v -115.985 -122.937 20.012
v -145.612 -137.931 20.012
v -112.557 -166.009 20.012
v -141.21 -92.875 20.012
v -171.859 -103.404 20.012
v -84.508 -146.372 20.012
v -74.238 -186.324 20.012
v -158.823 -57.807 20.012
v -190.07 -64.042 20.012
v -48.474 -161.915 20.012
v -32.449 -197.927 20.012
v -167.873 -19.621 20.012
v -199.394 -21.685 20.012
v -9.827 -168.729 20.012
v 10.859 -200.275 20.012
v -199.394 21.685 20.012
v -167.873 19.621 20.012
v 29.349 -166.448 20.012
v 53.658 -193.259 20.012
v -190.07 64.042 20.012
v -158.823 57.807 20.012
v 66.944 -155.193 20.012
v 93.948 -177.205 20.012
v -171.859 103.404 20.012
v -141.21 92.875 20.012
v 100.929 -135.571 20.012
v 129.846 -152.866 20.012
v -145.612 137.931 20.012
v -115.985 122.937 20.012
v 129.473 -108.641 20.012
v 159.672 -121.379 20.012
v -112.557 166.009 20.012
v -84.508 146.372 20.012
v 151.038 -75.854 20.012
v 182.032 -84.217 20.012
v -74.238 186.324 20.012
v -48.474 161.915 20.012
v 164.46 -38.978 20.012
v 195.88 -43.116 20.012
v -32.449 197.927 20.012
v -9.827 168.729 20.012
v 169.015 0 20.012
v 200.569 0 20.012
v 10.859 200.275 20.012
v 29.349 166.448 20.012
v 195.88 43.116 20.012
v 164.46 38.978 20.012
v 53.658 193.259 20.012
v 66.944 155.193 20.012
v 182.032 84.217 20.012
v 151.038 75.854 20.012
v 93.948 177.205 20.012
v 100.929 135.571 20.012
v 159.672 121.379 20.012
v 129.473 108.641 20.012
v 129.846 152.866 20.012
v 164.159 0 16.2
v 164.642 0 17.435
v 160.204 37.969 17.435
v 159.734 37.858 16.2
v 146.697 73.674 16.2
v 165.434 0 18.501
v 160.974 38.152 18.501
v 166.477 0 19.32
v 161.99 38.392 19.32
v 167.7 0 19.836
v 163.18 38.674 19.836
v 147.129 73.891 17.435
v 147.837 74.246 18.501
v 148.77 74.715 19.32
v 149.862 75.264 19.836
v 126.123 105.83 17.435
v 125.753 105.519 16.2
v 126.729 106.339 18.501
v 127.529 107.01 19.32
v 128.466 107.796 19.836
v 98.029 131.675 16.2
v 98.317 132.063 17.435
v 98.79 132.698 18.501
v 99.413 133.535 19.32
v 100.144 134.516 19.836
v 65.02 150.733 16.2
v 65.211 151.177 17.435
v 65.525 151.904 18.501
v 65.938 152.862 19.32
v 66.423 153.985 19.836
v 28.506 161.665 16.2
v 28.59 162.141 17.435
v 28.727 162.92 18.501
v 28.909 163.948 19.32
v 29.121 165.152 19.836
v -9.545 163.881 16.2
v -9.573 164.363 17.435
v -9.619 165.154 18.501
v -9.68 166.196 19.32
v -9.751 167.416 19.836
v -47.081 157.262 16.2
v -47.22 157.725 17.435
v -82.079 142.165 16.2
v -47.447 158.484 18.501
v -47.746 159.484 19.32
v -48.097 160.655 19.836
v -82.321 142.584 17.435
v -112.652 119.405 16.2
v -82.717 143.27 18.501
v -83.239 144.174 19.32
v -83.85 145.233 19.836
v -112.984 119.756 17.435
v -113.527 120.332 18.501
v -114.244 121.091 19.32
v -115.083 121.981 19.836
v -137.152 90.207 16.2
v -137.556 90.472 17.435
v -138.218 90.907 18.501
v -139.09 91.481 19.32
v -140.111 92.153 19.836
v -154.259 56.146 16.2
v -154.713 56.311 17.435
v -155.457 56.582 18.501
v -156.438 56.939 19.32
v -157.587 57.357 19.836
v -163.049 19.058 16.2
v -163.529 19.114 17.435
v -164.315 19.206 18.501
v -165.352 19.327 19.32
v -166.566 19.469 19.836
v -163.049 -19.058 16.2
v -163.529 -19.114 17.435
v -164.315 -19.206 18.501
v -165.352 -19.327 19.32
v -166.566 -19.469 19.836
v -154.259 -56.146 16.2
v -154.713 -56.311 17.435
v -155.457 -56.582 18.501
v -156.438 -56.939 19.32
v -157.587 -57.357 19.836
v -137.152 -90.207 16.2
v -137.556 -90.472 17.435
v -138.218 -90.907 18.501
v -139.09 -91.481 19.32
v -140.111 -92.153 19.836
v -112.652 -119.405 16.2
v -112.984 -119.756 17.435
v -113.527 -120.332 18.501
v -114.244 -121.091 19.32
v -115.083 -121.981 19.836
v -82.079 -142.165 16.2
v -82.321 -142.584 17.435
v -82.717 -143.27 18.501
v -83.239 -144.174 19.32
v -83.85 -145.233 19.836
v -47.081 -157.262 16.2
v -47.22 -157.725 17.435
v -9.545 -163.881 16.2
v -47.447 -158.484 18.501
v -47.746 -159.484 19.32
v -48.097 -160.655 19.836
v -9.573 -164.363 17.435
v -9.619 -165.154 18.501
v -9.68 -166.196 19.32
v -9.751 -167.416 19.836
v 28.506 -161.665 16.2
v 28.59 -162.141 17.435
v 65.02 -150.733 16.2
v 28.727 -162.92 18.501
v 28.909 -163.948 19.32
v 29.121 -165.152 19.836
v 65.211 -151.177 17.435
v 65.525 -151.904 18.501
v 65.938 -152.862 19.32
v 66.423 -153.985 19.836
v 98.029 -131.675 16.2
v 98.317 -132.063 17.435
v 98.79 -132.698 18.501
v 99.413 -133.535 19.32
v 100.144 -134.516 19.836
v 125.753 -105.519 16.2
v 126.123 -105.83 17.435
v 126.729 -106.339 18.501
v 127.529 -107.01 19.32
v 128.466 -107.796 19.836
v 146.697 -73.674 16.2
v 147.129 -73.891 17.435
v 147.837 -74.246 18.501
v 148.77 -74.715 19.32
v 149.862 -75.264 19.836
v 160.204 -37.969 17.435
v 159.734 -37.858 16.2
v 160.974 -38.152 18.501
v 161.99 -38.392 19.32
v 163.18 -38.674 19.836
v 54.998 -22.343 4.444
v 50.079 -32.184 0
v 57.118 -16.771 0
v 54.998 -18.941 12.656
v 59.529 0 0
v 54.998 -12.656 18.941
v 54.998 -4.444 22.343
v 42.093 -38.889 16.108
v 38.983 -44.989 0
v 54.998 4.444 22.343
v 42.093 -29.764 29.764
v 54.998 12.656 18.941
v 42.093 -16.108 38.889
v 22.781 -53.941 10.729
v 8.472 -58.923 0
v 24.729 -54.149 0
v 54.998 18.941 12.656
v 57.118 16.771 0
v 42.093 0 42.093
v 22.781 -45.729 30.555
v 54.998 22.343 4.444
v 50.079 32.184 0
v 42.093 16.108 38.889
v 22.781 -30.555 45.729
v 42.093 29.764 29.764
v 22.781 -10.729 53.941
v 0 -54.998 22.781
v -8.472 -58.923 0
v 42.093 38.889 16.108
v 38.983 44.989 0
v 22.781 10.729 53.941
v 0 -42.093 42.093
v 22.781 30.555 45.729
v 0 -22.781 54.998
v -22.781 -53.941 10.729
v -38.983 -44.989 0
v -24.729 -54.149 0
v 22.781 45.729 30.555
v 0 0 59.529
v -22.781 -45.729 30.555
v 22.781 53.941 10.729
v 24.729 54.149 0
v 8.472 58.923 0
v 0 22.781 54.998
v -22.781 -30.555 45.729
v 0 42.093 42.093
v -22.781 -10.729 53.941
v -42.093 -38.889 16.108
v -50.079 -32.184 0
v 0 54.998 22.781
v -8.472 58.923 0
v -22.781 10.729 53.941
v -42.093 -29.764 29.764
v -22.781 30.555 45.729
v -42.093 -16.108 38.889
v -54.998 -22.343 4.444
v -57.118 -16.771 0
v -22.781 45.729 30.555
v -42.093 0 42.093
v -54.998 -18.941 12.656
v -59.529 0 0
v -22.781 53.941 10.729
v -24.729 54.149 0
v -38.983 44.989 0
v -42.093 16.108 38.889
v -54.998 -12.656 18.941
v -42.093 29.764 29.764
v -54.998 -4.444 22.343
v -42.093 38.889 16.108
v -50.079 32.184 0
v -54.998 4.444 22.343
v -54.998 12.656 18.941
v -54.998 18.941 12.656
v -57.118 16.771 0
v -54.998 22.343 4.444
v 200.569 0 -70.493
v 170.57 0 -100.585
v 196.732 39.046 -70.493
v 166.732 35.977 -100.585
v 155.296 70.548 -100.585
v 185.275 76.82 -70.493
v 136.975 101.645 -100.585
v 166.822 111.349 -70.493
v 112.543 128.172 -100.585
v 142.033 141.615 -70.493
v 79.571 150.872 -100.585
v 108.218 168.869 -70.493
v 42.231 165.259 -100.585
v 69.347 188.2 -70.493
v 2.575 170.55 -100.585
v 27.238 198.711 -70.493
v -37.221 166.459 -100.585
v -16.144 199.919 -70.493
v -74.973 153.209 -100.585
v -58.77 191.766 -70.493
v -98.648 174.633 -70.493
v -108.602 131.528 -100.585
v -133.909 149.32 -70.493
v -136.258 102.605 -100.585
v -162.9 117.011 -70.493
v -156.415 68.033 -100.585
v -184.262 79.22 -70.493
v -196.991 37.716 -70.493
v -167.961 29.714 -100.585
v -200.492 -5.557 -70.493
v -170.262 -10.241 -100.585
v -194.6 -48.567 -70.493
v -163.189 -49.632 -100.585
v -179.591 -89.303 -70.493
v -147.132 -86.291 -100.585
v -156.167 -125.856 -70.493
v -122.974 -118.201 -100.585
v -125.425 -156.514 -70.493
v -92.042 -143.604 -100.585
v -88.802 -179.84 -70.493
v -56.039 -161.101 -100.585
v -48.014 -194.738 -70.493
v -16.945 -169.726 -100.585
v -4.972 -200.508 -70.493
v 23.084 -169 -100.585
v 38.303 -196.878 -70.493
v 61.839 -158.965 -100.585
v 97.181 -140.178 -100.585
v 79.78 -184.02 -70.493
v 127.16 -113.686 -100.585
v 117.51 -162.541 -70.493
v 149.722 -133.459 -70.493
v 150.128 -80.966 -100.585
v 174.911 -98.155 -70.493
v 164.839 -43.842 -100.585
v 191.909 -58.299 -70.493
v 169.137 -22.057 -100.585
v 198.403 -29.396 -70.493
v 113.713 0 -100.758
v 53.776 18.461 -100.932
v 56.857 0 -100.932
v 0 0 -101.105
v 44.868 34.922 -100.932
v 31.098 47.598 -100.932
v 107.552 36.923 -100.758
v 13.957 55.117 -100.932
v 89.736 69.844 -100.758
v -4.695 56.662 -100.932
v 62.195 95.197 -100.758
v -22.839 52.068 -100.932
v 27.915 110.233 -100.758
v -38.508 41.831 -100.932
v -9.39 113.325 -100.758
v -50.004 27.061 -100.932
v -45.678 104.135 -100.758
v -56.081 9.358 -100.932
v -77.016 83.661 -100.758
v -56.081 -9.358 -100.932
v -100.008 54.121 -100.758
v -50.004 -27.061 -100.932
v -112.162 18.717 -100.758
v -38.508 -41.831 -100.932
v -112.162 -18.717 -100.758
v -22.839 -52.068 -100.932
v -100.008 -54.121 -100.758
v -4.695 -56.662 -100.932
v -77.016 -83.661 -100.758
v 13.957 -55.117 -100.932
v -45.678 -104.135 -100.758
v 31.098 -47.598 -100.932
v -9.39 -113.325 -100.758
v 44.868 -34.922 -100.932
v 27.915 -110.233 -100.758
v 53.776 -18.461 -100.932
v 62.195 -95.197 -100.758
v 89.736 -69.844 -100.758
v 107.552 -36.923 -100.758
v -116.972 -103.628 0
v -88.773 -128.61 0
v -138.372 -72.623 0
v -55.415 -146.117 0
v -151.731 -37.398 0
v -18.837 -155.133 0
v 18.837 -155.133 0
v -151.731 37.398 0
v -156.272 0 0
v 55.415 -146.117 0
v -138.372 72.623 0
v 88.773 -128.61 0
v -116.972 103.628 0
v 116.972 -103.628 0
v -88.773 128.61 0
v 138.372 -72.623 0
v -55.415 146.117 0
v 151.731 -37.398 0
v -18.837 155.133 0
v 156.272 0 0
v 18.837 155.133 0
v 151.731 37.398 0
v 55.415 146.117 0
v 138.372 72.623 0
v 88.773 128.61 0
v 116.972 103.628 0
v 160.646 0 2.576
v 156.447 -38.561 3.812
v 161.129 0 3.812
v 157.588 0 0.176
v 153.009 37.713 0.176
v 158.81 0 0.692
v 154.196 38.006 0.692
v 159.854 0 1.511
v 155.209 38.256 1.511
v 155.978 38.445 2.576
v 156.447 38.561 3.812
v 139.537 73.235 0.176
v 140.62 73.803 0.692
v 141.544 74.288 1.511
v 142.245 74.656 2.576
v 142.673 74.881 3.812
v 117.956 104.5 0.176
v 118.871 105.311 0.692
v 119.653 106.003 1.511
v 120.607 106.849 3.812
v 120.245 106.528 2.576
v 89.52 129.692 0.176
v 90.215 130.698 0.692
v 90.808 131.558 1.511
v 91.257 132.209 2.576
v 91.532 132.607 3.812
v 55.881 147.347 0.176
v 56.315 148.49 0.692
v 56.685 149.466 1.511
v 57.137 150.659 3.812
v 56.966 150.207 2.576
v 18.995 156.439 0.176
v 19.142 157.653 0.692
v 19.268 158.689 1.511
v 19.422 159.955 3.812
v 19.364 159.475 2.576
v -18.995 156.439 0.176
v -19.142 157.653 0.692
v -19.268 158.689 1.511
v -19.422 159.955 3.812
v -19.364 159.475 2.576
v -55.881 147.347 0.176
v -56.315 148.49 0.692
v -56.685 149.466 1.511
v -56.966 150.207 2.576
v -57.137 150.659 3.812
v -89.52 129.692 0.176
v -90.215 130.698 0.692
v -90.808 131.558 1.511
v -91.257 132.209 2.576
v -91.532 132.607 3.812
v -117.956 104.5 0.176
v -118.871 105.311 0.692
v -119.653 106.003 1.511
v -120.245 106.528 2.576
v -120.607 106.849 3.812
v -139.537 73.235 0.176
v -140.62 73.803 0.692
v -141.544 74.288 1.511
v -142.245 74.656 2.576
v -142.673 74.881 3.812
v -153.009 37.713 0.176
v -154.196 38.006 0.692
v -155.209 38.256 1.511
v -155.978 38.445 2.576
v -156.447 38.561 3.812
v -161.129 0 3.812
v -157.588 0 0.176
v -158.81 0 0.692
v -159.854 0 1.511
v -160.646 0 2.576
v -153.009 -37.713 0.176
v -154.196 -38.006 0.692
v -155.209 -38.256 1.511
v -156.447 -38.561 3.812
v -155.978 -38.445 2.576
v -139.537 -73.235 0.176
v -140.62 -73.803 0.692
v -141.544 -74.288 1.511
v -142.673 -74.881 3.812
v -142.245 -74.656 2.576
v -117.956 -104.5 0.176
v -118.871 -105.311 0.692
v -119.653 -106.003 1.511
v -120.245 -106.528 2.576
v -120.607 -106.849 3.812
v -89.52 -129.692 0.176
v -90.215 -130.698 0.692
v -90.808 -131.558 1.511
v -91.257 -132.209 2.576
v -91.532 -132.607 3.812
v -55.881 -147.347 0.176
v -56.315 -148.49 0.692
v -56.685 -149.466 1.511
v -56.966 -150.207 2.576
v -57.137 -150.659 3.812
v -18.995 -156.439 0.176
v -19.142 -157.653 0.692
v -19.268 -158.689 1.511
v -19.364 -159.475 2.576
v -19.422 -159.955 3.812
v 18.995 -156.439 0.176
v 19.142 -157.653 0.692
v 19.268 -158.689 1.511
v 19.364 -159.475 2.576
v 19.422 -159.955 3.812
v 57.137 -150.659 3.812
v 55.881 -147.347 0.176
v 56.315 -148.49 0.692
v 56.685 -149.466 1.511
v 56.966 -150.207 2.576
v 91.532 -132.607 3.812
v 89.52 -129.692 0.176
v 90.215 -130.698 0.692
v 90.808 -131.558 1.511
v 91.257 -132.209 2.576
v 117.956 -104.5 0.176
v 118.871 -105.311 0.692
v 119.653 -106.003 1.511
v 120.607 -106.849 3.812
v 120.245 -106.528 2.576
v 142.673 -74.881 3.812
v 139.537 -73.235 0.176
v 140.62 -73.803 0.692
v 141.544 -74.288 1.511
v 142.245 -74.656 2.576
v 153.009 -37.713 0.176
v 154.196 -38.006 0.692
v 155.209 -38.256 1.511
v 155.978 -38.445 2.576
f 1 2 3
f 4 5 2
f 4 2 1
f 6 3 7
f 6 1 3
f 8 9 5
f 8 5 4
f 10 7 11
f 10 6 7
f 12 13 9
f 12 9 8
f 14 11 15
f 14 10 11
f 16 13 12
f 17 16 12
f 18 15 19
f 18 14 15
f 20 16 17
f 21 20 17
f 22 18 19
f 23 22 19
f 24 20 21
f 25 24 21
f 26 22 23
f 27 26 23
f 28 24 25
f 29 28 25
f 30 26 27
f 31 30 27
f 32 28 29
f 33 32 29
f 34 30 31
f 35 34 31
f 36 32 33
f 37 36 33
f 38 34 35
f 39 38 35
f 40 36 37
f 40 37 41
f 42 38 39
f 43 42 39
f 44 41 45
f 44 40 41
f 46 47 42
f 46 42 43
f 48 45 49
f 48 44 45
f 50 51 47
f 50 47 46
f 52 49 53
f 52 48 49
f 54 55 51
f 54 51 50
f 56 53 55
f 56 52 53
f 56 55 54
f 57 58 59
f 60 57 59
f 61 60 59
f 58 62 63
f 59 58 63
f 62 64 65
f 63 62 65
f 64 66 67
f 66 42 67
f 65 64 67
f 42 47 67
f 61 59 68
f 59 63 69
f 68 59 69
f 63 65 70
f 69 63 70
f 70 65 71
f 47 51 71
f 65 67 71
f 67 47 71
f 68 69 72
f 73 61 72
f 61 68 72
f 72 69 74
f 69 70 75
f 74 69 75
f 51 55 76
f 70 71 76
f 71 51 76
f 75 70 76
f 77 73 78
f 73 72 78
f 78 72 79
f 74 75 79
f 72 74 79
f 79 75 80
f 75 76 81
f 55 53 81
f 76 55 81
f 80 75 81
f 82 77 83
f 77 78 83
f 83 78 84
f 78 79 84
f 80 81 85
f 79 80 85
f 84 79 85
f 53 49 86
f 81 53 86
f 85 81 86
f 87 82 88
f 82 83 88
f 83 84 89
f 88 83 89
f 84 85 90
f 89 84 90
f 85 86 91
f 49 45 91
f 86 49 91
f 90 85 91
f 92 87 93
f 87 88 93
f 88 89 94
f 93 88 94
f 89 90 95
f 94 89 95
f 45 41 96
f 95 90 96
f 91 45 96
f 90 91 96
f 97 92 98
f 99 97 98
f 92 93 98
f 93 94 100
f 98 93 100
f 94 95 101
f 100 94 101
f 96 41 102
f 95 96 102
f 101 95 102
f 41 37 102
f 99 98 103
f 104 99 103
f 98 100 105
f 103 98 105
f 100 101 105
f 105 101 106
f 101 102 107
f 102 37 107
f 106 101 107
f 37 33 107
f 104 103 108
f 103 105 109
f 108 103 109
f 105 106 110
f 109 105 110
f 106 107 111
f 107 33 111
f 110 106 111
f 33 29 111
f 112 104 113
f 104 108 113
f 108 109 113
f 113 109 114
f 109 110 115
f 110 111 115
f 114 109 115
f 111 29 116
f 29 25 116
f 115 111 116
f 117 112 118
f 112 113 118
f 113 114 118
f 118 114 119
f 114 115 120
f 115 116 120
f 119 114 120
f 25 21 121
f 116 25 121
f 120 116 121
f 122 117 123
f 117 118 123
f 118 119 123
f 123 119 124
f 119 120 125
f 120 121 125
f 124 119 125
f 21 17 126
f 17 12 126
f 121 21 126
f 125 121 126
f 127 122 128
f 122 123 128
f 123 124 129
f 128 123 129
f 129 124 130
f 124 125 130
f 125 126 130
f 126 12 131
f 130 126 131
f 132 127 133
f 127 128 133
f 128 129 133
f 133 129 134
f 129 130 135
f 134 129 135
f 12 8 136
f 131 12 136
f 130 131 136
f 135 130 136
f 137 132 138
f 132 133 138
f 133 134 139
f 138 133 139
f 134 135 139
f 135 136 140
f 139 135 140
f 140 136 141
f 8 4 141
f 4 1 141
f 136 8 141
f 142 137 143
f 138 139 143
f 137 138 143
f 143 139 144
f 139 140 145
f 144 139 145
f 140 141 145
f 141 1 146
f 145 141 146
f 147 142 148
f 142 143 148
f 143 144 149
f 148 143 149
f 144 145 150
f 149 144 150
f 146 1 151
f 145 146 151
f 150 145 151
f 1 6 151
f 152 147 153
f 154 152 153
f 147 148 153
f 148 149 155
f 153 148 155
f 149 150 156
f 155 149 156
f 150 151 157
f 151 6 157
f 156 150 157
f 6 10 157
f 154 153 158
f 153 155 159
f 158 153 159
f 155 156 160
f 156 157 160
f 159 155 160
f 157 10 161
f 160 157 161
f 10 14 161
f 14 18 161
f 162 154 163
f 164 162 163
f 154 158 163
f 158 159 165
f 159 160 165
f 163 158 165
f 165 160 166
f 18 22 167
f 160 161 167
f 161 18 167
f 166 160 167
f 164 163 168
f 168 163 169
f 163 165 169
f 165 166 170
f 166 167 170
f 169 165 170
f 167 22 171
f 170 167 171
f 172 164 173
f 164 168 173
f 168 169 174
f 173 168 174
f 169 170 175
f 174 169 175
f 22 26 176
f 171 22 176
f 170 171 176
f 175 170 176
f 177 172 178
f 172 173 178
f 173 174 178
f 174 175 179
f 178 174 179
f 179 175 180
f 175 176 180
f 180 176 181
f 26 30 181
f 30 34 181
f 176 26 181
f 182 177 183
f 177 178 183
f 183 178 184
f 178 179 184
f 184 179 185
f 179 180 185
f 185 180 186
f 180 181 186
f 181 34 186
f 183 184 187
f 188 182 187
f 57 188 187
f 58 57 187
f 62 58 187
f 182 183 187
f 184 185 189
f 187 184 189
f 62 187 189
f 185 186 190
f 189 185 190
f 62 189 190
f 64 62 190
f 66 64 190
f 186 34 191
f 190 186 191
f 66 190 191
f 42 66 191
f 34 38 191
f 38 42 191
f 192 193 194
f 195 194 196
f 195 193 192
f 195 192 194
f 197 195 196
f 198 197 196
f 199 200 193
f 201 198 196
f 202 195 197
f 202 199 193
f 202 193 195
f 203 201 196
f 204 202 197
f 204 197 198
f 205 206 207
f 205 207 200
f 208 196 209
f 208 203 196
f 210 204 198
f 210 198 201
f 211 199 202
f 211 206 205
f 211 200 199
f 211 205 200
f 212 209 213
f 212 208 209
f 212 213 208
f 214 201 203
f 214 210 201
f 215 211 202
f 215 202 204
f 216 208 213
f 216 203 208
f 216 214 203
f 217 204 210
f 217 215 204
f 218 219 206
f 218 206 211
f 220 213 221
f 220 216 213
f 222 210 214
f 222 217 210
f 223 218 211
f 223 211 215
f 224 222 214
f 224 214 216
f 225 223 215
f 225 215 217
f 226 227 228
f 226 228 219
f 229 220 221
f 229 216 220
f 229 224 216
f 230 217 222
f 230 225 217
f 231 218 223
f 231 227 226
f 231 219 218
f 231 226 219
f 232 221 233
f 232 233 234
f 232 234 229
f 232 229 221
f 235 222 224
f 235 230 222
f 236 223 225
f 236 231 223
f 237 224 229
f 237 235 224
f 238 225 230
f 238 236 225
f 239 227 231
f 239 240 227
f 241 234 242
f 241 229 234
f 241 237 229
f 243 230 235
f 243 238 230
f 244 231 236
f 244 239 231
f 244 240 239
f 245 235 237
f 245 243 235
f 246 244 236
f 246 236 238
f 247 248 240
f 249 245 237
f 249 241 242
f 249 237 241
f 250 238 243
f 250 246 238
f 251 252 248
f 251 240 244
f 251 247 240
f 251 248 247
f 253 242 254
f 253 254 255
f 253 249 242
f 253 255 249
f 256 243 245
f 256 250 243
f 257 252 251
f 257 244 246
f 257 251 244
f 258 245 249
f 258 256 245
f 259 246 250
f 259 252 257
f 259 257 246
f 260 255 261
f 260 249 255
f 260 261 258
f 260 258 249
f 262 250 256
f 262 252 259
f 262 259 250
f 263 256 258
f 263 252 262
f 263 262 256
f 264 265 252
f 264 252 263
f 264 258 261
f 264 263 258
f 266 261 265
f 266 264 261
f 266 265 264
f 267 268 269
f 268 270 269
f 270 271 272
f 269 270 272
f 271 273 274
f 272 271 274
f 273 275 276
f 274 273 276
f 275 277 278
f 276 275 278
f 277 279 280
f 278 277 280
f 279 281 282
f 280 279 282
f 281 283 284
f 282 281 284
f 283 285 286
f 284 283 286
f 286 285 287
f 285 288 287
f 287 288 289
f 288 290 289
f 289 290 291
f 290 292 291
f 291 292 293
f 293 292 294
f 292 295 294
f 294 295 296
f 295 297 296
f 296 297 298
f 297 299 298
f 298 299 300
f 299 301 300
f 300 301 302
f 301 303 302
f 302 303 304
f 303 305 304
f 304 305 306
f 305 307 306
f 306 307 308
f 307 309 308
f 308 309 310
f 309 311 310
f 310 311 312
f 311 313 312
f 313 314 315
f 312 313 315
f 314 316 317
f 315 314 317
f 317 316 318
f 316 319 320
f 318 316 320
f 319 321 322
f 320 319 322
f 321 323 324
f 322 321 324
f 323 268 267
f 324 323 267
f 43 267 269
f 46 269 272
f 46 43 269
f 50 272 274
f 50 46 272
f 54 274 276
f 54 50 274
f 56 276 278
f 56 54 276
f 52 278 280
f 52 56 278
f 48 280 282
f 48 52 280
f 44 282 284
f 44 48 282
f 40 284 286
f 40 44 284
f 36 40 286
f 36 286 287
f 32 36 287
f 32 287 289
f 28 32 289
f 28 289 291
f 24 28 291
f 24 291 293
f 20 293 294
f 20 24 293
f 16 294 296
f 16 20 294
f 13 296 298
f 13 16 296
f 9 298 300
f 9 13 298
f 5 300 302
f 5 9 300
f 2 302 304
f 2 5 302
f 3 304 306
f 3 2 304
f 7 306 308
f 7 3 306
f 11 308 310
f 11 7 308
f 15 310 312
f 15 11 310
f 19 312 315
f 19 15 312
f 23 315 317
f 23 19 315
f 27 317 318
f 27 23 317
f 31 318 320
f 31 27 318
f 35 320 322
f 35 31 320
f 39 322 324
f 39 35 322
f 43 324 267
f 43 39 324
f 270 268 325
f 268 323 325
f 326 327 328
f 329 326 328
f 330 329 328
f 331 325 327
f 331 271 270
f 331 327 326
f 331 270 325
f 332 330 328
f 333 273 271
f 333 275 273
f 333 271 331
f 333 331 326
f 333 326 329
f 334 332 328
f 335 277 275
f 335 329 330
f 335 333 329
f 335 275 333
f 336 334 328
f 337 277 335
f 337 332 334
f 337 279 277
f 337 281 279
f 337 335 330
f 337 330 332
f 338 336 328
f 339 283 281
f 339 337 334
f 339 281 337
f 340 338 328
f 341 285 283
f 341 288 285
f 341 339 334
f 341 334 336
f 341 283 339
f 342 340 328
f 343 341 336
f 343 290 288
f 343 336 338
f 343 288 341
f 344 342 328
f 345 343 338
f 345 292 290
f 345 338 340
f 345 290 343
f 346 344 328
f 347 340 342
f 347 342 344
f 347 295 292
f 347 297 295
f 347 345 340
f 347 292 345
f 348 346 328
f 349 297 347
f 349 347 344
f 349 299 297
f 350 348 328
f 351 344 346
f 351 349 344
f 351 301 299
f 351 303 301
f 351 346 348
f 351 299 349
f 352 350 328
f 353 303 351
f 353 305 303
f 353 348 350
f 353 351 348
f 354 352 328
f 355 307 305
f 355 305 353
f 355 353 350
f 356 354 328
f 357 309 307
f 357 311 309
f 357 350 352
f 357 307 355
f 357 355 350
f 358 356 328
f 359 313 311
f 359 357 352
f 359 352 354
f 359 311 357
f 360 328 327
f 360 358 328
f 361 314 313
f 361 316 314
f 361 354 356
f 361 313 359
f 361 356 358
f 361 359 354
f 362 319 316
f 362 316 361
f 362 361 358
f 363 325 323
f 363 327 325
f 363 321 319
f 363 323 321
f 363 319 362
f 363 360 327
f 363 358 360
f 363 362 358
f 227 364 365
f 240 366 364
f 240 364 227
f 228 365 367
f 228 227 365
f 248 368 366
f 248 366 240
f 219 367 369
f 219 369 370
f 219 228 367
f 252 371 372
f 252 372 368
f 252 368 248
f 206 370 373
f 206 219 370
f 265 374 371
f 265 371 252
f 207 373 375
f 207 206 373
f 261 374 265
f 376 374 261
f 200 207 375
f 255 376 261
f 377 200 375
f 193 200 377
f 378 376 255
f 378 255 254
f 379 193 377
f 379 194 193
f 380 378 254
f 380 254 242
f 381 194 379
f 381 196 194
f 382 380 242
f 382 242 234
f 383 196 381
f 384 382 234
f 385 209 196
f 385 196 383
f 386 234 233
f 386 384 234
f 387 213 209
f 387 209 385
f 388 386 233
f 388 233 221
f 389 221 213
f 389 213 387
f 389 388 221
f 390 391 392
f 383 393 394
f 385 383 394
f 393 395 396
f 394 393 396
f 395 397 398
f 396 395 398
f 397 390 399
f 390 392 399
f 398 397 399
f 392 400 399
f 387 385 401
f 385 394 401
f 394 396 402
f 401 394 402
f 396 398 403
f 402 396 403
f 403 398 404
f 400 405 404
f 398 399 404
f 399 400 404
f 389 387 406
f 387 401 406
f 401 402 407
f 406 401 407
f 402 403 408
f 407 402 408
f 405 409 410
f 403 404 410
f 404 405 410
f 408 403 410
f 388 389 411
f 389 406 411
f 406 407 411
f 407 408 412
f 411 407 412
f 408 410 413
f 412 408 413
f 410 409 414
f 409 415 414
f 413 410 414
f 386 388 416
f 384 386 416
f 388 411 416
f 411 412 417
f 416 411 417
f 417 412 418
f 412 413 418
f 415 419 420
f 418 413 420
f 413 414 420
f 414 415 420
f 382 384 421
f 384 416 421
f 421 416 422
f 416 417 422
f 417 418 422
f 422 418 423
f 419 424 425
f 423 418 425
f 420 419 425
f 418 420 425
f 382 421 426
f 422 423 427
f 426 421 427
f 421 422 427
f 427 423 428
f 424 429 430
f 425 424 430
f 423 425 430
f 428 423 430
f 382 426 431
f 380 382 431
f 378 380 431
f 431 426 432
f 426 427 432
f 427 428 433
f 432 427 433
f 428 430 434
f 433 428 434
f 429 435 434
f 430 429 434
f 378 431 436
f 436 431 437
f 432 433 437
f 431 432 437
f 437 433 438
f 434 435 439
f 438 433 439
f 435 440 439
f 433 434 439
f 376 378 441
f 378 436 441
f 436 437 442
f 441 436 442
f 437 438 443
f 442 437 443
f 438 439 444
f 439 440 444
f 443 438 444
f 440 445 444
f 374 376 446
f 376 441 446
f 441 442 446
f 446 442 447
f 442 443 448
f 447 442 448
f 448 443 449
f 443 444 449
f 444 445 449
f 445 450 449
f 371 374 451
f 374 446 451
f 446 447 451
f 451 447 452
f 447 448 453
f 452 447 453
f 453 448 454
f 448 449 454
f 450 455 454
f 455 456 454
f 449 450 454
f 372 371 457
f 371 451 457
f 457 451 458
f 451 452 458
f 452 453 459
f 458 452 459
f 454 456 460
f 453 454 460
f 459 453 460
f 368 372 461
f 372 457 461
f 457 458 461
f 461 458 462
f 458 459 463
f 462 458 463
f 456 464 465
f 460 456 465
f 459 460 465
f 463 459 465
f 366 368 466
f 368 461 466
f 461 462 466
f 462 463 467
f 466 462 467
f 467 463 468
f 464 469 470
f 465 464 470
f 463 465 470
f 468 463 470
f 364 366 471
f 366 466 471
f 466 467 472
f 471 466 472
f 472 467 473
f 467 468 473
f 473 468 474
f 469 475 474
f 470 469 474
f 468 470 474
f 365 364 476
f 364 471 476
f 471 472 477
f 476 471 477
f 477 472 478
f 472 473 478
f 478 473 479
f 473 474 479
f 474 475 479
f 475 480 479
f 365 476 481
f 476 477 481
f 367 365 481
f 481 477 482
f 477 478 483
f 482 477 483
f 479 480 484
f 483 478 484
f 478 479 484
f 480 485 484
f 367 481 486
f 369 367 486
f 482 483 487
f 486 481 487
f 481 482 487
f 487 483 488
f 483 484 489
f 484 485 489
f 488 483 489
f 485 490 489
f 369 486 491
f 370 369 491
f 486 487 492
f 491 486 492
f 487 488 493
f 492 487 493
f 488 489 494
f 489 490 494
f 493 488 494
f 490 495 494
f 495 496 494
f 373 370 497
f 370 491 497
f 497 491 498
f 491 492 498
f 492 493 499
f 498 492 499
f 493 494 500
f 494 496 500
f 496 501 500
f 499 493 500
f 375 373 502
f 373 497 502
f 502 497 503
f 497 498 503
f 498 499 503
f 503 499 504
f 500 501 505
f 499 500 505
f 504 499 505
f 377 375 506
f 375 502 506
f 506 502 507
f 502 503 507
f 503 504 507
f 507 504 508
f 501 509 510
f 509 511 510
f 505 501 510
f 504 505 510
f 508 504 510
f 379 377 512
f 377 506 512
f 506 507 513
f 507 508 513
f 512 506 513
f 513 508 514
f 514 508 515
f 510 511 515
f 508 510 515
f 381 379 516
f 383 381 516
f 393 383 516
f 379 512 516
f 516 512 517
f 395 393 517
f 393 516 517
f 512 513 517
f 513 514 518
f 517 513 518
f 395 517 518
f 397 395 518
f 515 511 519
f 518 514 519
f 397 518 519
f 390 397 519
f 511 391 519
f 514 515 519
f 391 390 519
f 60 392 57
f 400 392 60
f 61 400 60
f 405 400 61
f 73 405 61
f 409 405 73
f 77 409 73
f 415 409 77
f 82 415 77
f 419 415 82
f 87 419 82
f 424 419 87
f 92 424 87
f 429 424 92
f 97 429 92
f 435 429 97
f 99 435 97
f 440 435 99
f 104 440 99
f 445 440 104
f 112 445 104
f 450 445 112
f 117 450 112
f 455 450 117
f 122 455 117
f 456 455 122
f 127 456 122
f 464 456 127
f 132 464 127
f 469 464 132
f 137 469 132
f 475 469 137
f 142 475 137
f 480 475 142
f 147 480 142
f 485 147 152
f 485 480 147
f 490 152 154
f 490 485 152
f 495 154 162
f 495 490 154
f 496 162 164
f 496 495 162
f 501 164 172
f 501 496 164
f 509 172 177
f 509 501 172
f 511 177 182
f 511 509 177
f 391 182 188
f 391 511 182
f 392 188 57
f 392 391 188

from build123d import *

# Parameters (mm, degrees)
F2_SIZE = 30
F5_R    = 5


with BuildPart() as f1:
    # F0 (on Front) → F1 (revolve)
    with BuildSketch(Plane.XZ):
        Polygon((0, 0), (0, -101.104952), (200.569421, -100.49326), (200.569421, 20.011885), (165.090755, 20.011885), (160.197139, 0), align=None)
    revolve(axis=Axis((0, 0, -50.552476), (0, 0, 1)))

    # F2
    f2_edges = [f1.edges().sort_by_distance(p)[0] for p in [
        (-200.569421, 0, -100.49326),
    ]]
    chamfer(f2_edges, length=F2_SIZE)

    # F3 (on Front) → F4 (revolve)
    with BuildSketch(Plane.XZ):
        with BuildLine():
            Line((0, 0), (59.528868, 0))
            ThreePointArc((59.528868, 0), (0, 59.528868), (-59.528868, 0))
            Line((-59.528868, 0), (0, 0))
        make_face()
    revolve(axis=Axis((-29.764434, 0, 0), (-1, 0, 0)))

    # F5
    f5_edges = [f1.edges().sort_by_distance(p)[0] for p in [
        (-165.090755, 0, 20.011885),
        (-160.197139, 0, 0),
    ]]
    fillet(f5_edges, radius=F5_R)


solid = f1.part
